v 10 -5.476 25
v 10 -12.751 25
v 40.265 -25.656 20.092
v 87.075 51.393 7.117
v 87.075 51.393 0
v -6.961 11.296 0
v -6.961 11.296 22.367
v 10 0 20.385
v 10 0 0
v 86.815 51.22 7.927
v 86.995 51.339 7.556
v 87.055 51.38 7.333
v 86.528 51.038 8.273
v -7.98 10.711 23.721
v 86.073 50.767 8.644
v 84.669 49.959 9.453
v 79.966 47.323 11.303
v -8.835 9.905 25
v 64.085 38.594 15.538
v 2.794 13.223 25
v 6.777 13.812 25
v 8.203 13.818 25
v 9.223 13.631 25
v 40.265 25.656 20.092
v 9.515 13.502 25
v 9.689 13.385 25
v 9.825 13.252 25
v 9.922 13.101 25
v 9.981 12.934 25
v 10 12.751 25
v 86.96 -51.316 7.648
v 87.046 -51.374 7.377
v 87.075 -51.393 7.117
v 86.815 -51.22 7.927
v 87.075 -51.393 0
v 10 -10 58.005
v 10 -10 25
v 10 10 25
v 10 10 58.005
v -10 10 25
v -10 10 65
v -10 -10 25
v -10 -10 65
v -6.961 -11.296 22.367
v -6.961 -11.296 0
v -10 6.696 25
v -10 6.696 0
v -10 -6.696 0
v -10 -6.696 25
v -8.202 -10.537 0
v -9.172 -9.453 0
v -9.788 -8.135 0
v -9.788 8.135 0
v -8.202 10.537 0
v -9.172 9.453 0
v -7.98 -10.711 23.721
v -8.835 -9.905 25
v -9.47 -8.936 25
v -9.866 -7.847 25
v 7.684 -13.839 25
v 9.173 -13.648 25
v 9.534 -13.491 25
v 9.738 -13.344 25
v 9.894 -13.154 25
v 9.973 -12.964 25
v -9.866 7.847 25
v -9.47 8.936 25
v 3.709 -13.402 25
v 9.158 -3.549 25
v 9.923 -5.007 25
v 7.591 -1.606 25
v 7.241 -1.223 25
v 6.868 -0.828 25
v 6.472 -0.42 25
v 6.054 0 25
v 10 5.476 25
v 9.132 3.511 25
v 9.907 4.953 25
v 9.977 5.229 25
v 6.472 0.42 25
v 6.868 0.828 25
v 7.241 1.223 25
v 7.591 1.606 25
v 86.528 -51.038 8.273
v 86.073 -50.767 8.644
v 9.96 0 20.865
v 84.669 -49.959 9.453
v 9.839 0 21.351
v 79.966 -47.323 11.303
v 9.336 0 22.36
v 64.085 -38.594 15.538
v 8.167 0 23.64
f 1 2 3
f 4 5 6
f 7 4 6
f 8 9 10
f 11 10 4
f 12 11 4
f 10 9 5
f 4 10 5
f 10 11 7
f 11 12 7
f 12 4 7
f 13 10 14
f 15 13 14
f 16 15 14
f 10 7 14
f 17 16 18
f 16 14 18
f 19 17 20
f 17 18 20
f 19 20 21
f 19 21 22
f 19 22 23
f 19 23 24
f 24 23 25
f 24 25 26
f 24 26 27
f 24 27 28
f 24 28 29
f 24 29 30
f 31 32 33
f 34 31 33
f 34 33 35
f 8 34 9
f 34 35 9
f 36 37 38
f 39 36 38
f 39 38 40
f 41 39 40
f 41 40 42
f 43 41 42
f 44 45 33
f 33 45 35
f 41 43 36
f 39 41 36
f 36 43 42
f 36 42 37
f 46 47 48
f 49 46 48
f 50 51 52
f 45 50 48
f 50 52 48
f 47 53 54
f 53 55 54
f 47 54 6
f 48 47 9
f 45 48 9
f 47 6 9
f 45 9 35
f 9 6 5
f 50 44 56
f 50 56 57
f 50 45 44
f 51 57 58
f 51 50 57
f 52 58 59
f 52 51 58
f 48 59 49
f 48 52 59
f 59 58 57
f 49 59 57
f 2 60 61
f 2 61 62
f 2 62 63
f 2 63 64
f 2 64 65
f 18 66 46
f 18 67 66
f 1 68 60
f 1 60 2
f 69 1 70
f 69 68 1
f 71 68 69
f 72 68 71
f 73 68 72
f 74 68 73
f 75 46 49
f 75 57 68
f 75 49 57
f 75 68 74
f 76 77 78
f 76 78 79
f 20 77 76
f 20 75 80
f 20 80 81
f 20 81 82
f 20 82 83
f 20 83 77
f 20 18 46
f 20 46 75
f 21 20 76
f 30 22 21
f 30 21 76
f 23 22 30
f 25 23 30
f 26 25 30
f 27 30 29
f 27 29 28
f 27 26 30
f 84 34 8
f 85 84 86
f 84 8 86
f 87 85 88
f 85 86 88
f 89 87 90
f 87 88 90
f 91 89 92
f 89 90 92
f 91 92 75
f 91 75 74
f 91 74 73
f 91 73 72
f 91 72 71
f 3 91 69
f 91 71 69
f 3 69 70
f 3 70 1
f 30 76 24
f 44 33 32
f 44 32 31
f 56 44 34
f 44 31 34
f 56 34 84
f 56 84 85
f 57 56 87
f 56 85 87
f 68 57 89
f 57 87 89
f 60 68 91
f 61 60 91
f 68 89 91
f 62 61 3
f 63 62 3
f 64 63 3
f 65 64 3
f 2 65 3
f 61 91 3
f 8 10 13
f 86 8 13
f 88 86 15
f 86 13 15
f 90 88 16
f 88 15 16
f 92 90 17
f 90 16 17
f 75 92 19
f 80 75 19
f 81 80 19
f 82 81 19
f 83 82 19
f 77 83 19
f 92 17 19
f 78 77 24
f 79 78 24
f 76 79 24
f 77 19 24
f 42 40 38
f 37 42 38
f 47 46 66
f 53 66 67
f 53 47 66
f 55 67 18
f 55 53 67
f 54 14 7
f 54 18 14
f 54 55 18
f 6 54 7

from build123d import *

# Parameters (mm, degrees)
F1_DEPTH      = 20
F2_DEPTH      = 25
F4_DEPTH      = 40
F6_DEPTH      = 61.3939463923
F8_DEPTH      = 84.6
F11_T1_DEPTH  = 41.5178477753
F11_T3_DEPTH  = 137.9615849437
F11_T5_DEPTH  = 137.9615849437
F11_T10_DEPTH = 139.2179253021
F11_T15_DEPTH = 139.2179253021
F11_T21_DEPTH = 139.2179253021
F11_T27_DEPTH = 139.2179253021


# Not quite as in the source:
# - a fillet or chamfer that OpenCascade refuses, or shapes differently, is made with other operations: its cross-section is extruded or revolved along the edge and cut away or added
# - a feature of the source that left no trace in its solid (it failed there, or was rolled back) is left out


with BuildPart() as f1:
    # F0 (on Top) → F1 (new body)
    with BuildSketch(Plane.XY):
        Polygon((87.0753377676, -51.3929463923), (10, 0), (10, -10), (-10, -10), align=None)
        Polygon((10, 0), (10, 10), (-10, 10), (-10, -10), (10, -10), align=None)
        Polygon((-10, 10), (10, 10), (10, 0), (87.0753377676, 51.3929463923), align=None)
    extrude(amount=F1_DEPTH)

    # F0 (on Top) → F2 (join)
    with BuildSketch(Plane.XY):
        Polygon((10, 0), (10, 10), (-10, 10), (-10, -10), (10, -10), align=None)
        Polygon((-10, 10), (10, 10), (10, 0), (87.0753377676, 51.3929463923), align=None)
        Polygon((87.0753377676, -51.3929463923), (10, 0), (10, -10), (-10, -10), align=None)
    extrude(amount=F2_DEPTH)

    # F7 (on Front) → F8 (cut, symmetric)
    with BuildSketch(Plane.XZ):
        Polygon((87.0753377676, 25), (10, 25), (87.0753377676, 12.5), align=None)
    extrude(amount=F8_DEPTH, both=True, mode=Mode.SUBTRACT)

    # F11: fillet of radius 5 on 6 edges, made by hand

    # F11_s2 → F11_t1 (cut)
    with BuildSketch(Plane.XY.offset(-8.2589238876)):
        with BuildLine():
            ThreePointArc((-6.9611566724, -11.2957634951), (-9.1716773222, -9.452715684), (-10, -6.6964304449))
            Line((-10, -6.6964304449), (-10, -10))
            Line((-10, -10), (-6.9611566724, -11.2957634951))
        make_face()
        with BuildLine():
            ThreePointArc((-10, 6.6964304449), (-9.1716773222, 9.452715684), (-6.9611566724, 11.2957634951))
            Line((-6.9611566724, 11.2957634951), (-10, 10))
            Line((-10, 10), (-10, 6.6964304449))
        make_face()
    extrude(amount=F11_T1_DEPTH, mode=Mode.SUBTRACT)

    # F11_s4 → F11_t3 (cut)
    with BuildSketch(Plane(origin=(100.6464893313, -42.9156862419, -16.3227454213), x_dir=(-0.3922313345, -0.91986661, 0), z_dir=(-0.909798278, 0.3879381954, 0.1475501607))):
        with BuildLine():
            ThreePointArc((13.1209794451, 21.83145176), (11.5437136037, 25.4762961846), (7.8070230934, 26.821585166))
            Line((7.8070230934, 26.821585166), (13.1209794451, 27.1559149751))
            Line((13.1209794451, 27.1559149751), (13.1209794451, 21.83145176))
        make_face()
    extrude(amount=F11_T3_DEPTH, mode=Mode.SUBTRACT)

    # F11_s6 → F11_t5 (cut)
    with BuildSketch(Plane(origin=(-24.87072308, -10.604882052, 4.0335086099), x_dir=(-0.3922313345, 0.91986661, 0), z_dir=(0.909798278, 0.3879381954, -0.1475501607))):
        with BuildLine():
            ThreePointArc((13.1209794451, 21.83145176), (11.5437136037, 25.4762961846), (7.8070230934, 26.821585166))
            Line((7.8070230934, 26.821585166), (13.1209794451, 27.1559149751))
            Line((13.1209794451, 27.1559149751), (13.1209794451, 21.83145176))
        make_face()
    extrude(amount=F11_T5_DEPTH, mode=Mode.SUBTRACT)


with BuildPart() as f4:
    # F3 (on face) → F4 (new body)
    with BuildSketch(Plane.XY.offset(25)):
        Polygon((10, 10), (-10, 10), (-10, -10), (10, -10), (10, 0), align=None)
    extrude(amount=F4_DEPTH)

    # F5 (on face) → F6 (cut, through all)
    with BuildSketch(Plane.XZ.offset(10)):
        Polygon((10, 65), (-10, 65), (10, 58.0052025616), align=None)
    extrude(amount=-F6_DEPTH, mode=Mode.SUBTRACT)


with BuildPart() as f11_tool8:
    # F11_s9 → F11_t10 (new body)
    with BuildSketch(Plane(origin=(-24.2435670935, 16.1653309616, 3.931797089), x_dir=(0.5547703521, 0.8320035195, 0), z_dir=(0.8245312391, -0.5497879218, -0.133721639))):
        with BuildLine():
            ThreePointArc((5.5477035213, 21.3140260519), (4.2368967072, 24.6889117739), (0.9917620666, 26.2942682155))
            Line((0.9917620666, 26.2942682155), (5.5477035213, 25.8880420385))
            Line((5.5477035213, 25.8880420385), (5.5477035213, 21.3140260519))
        make_face()
    extrude(amount=F11_T10_DEPTH)

    split(bisect_by=Plane(origin=(3.077701436, -4.6157088547, 0), x_dir=(0, 0, 1), z_dir=(0.5547703521, -0.8320035195, 0)), keep=Keep.TOP)


with BuildPart() as f1_1:
    add(f1.part)

    # F11_t7: cut F11_tool8
    add(f11_tool8.part, mode=Mode.SUBTRACT)


with BuildPart() as f11_tool13:
    # F11_s14 → F11_t15 (new body)
    with BuildSketch(Plane(origin=(90.5459613675, 60.3750028658, -14.6846520544), x_dir=(0.5547703521, -0.8320035195, 0), z_dir=(-0.8245312391, -0.5497879218, 0.133721639))):
        with BuildLine():
            ThreePointArc((5.5477035213, 21.3140260519), (4.2368967072, 24.6889117739), (0.9917620666, 26.2942682155))
            Line((0.9917620666, 26.2942682155), (5.5477035213, 25.8880420385))
            Line((5.5477035213, 25.8880420385), (5.5477035213, 21.3140260519))
        make_face()
    extrude(amount=F11_T15_DEPTH)

    split(bisect_by=Plane(origin=(3.077701436, 4.6157088547, 0), x_dir=(0, 0, 1), z_dir=(0.5547703521, 0.8320035195, 0)), keep=Keep.TOP)


with BuildPart() as f1_2:
    add(f1_1.part)

    # F11_t12: cut F11_tool13
    add(f11_tool13.part, mode=Mode.SUBTRACT)


with BuildPart() as f11_tool19:
    # F11_s20 → F11_t21 (new body)
    with BuildSketch(Plane(origin=(-24.2435670935, 16.1653309616, 3.931797089), x_dir=(0.5547703521, 0.8320035195, 0), z_dir=(0.8245312391, -0.5497879218, -0.133721639))):
        with BuildLine():
            ThreePointArc((5.5477035213, 21.3140260519), (4.2368967072, 24.6889117739), (0.9917620666, 26.2942682155))
            Line((0.9917620666, 26.2942682155), (5.5477035213, 25.8880420385))
            Line((5.5477035213, 25.8880420385), (5.5477035213, 21.3140260519))
        make_face()
    extrude(amount=F11_T21_DEPTH)

    split(bisect_by=Plane(origin=(3.077701436, -4.6157088547, 0), x_dir=(0, 0, 1), z_dir=(-0.5547703521, 0.8320035195, 0)), keep=Keep.TOP)

    split(bisect_by=Plane.XY.offset(25), keep=Keep.BOTTOM)

    split(bisect_by=Plane(origin=(-5.1464592774, 12.0695508825, 0), x_dir=(0, 0, 1), z_dir=(0.3922313345, -0.91986661, 0)), keep=Keep.TOP)


with BuildPart() as f11_tool25:
    # F11_s26 → F11_t27 (new body)
    with BuildSketch(Plane(origin=(90.5459613675, 60.3750028658, -14.6846520544), x_dir=(0.5547703521, -0.8320035195, 0), z_dir=(-0.8245312391, -0.5497879218, 0.133721639))):
        with BuildLine():
            ThreePointArc((5.5477035213, 21.3140260519), (4.2368967072, 24.6889117739), (0.9917620666, 26.2942682155))
            Line((0.9917620666, 26.2942682155), (5.5477035213, 25.8880420385))
            Line((5.5477035213, 25.8880420385), (5.5477035213, 21.3140260519))
        make_face()
    extrude(amount=F11_T27_DEPTH)

    split(bisect_by=Plane(origin=(3.077701436, 4.6157088547, 0), x_dir=(0, 0, 1), z_dir=(-0.5547703521, -0.8320035195, 0)), keep=Keep.TOP)

    split(bisect_by=Plane(origin=(-5.1464592774, -12.0695508825, 0), x_dir=(0, 0, 1), z_dir=(0.3922313345, 0.91986661, 0)), keep=Keep.TOP)

    split(bisect_by=Plane.XY.offset(25), keep=Keep.BOTTOM)


with BuildPart() as f11_tool19_1:
    add(f11_tool19.part)

    # F11_t31: intersect F11_tool25
    add(f11_tool25.part, mode=Mode.INTERSECT)


with BuildPart() as f1_3:
    add(f1_2.part)

    # F11_t17: cut F11_tool19
    add(f11_tool19_1.part, mode=Mode.SUBTRACT)


solid = Compound([f4.part, f1_3.part])
